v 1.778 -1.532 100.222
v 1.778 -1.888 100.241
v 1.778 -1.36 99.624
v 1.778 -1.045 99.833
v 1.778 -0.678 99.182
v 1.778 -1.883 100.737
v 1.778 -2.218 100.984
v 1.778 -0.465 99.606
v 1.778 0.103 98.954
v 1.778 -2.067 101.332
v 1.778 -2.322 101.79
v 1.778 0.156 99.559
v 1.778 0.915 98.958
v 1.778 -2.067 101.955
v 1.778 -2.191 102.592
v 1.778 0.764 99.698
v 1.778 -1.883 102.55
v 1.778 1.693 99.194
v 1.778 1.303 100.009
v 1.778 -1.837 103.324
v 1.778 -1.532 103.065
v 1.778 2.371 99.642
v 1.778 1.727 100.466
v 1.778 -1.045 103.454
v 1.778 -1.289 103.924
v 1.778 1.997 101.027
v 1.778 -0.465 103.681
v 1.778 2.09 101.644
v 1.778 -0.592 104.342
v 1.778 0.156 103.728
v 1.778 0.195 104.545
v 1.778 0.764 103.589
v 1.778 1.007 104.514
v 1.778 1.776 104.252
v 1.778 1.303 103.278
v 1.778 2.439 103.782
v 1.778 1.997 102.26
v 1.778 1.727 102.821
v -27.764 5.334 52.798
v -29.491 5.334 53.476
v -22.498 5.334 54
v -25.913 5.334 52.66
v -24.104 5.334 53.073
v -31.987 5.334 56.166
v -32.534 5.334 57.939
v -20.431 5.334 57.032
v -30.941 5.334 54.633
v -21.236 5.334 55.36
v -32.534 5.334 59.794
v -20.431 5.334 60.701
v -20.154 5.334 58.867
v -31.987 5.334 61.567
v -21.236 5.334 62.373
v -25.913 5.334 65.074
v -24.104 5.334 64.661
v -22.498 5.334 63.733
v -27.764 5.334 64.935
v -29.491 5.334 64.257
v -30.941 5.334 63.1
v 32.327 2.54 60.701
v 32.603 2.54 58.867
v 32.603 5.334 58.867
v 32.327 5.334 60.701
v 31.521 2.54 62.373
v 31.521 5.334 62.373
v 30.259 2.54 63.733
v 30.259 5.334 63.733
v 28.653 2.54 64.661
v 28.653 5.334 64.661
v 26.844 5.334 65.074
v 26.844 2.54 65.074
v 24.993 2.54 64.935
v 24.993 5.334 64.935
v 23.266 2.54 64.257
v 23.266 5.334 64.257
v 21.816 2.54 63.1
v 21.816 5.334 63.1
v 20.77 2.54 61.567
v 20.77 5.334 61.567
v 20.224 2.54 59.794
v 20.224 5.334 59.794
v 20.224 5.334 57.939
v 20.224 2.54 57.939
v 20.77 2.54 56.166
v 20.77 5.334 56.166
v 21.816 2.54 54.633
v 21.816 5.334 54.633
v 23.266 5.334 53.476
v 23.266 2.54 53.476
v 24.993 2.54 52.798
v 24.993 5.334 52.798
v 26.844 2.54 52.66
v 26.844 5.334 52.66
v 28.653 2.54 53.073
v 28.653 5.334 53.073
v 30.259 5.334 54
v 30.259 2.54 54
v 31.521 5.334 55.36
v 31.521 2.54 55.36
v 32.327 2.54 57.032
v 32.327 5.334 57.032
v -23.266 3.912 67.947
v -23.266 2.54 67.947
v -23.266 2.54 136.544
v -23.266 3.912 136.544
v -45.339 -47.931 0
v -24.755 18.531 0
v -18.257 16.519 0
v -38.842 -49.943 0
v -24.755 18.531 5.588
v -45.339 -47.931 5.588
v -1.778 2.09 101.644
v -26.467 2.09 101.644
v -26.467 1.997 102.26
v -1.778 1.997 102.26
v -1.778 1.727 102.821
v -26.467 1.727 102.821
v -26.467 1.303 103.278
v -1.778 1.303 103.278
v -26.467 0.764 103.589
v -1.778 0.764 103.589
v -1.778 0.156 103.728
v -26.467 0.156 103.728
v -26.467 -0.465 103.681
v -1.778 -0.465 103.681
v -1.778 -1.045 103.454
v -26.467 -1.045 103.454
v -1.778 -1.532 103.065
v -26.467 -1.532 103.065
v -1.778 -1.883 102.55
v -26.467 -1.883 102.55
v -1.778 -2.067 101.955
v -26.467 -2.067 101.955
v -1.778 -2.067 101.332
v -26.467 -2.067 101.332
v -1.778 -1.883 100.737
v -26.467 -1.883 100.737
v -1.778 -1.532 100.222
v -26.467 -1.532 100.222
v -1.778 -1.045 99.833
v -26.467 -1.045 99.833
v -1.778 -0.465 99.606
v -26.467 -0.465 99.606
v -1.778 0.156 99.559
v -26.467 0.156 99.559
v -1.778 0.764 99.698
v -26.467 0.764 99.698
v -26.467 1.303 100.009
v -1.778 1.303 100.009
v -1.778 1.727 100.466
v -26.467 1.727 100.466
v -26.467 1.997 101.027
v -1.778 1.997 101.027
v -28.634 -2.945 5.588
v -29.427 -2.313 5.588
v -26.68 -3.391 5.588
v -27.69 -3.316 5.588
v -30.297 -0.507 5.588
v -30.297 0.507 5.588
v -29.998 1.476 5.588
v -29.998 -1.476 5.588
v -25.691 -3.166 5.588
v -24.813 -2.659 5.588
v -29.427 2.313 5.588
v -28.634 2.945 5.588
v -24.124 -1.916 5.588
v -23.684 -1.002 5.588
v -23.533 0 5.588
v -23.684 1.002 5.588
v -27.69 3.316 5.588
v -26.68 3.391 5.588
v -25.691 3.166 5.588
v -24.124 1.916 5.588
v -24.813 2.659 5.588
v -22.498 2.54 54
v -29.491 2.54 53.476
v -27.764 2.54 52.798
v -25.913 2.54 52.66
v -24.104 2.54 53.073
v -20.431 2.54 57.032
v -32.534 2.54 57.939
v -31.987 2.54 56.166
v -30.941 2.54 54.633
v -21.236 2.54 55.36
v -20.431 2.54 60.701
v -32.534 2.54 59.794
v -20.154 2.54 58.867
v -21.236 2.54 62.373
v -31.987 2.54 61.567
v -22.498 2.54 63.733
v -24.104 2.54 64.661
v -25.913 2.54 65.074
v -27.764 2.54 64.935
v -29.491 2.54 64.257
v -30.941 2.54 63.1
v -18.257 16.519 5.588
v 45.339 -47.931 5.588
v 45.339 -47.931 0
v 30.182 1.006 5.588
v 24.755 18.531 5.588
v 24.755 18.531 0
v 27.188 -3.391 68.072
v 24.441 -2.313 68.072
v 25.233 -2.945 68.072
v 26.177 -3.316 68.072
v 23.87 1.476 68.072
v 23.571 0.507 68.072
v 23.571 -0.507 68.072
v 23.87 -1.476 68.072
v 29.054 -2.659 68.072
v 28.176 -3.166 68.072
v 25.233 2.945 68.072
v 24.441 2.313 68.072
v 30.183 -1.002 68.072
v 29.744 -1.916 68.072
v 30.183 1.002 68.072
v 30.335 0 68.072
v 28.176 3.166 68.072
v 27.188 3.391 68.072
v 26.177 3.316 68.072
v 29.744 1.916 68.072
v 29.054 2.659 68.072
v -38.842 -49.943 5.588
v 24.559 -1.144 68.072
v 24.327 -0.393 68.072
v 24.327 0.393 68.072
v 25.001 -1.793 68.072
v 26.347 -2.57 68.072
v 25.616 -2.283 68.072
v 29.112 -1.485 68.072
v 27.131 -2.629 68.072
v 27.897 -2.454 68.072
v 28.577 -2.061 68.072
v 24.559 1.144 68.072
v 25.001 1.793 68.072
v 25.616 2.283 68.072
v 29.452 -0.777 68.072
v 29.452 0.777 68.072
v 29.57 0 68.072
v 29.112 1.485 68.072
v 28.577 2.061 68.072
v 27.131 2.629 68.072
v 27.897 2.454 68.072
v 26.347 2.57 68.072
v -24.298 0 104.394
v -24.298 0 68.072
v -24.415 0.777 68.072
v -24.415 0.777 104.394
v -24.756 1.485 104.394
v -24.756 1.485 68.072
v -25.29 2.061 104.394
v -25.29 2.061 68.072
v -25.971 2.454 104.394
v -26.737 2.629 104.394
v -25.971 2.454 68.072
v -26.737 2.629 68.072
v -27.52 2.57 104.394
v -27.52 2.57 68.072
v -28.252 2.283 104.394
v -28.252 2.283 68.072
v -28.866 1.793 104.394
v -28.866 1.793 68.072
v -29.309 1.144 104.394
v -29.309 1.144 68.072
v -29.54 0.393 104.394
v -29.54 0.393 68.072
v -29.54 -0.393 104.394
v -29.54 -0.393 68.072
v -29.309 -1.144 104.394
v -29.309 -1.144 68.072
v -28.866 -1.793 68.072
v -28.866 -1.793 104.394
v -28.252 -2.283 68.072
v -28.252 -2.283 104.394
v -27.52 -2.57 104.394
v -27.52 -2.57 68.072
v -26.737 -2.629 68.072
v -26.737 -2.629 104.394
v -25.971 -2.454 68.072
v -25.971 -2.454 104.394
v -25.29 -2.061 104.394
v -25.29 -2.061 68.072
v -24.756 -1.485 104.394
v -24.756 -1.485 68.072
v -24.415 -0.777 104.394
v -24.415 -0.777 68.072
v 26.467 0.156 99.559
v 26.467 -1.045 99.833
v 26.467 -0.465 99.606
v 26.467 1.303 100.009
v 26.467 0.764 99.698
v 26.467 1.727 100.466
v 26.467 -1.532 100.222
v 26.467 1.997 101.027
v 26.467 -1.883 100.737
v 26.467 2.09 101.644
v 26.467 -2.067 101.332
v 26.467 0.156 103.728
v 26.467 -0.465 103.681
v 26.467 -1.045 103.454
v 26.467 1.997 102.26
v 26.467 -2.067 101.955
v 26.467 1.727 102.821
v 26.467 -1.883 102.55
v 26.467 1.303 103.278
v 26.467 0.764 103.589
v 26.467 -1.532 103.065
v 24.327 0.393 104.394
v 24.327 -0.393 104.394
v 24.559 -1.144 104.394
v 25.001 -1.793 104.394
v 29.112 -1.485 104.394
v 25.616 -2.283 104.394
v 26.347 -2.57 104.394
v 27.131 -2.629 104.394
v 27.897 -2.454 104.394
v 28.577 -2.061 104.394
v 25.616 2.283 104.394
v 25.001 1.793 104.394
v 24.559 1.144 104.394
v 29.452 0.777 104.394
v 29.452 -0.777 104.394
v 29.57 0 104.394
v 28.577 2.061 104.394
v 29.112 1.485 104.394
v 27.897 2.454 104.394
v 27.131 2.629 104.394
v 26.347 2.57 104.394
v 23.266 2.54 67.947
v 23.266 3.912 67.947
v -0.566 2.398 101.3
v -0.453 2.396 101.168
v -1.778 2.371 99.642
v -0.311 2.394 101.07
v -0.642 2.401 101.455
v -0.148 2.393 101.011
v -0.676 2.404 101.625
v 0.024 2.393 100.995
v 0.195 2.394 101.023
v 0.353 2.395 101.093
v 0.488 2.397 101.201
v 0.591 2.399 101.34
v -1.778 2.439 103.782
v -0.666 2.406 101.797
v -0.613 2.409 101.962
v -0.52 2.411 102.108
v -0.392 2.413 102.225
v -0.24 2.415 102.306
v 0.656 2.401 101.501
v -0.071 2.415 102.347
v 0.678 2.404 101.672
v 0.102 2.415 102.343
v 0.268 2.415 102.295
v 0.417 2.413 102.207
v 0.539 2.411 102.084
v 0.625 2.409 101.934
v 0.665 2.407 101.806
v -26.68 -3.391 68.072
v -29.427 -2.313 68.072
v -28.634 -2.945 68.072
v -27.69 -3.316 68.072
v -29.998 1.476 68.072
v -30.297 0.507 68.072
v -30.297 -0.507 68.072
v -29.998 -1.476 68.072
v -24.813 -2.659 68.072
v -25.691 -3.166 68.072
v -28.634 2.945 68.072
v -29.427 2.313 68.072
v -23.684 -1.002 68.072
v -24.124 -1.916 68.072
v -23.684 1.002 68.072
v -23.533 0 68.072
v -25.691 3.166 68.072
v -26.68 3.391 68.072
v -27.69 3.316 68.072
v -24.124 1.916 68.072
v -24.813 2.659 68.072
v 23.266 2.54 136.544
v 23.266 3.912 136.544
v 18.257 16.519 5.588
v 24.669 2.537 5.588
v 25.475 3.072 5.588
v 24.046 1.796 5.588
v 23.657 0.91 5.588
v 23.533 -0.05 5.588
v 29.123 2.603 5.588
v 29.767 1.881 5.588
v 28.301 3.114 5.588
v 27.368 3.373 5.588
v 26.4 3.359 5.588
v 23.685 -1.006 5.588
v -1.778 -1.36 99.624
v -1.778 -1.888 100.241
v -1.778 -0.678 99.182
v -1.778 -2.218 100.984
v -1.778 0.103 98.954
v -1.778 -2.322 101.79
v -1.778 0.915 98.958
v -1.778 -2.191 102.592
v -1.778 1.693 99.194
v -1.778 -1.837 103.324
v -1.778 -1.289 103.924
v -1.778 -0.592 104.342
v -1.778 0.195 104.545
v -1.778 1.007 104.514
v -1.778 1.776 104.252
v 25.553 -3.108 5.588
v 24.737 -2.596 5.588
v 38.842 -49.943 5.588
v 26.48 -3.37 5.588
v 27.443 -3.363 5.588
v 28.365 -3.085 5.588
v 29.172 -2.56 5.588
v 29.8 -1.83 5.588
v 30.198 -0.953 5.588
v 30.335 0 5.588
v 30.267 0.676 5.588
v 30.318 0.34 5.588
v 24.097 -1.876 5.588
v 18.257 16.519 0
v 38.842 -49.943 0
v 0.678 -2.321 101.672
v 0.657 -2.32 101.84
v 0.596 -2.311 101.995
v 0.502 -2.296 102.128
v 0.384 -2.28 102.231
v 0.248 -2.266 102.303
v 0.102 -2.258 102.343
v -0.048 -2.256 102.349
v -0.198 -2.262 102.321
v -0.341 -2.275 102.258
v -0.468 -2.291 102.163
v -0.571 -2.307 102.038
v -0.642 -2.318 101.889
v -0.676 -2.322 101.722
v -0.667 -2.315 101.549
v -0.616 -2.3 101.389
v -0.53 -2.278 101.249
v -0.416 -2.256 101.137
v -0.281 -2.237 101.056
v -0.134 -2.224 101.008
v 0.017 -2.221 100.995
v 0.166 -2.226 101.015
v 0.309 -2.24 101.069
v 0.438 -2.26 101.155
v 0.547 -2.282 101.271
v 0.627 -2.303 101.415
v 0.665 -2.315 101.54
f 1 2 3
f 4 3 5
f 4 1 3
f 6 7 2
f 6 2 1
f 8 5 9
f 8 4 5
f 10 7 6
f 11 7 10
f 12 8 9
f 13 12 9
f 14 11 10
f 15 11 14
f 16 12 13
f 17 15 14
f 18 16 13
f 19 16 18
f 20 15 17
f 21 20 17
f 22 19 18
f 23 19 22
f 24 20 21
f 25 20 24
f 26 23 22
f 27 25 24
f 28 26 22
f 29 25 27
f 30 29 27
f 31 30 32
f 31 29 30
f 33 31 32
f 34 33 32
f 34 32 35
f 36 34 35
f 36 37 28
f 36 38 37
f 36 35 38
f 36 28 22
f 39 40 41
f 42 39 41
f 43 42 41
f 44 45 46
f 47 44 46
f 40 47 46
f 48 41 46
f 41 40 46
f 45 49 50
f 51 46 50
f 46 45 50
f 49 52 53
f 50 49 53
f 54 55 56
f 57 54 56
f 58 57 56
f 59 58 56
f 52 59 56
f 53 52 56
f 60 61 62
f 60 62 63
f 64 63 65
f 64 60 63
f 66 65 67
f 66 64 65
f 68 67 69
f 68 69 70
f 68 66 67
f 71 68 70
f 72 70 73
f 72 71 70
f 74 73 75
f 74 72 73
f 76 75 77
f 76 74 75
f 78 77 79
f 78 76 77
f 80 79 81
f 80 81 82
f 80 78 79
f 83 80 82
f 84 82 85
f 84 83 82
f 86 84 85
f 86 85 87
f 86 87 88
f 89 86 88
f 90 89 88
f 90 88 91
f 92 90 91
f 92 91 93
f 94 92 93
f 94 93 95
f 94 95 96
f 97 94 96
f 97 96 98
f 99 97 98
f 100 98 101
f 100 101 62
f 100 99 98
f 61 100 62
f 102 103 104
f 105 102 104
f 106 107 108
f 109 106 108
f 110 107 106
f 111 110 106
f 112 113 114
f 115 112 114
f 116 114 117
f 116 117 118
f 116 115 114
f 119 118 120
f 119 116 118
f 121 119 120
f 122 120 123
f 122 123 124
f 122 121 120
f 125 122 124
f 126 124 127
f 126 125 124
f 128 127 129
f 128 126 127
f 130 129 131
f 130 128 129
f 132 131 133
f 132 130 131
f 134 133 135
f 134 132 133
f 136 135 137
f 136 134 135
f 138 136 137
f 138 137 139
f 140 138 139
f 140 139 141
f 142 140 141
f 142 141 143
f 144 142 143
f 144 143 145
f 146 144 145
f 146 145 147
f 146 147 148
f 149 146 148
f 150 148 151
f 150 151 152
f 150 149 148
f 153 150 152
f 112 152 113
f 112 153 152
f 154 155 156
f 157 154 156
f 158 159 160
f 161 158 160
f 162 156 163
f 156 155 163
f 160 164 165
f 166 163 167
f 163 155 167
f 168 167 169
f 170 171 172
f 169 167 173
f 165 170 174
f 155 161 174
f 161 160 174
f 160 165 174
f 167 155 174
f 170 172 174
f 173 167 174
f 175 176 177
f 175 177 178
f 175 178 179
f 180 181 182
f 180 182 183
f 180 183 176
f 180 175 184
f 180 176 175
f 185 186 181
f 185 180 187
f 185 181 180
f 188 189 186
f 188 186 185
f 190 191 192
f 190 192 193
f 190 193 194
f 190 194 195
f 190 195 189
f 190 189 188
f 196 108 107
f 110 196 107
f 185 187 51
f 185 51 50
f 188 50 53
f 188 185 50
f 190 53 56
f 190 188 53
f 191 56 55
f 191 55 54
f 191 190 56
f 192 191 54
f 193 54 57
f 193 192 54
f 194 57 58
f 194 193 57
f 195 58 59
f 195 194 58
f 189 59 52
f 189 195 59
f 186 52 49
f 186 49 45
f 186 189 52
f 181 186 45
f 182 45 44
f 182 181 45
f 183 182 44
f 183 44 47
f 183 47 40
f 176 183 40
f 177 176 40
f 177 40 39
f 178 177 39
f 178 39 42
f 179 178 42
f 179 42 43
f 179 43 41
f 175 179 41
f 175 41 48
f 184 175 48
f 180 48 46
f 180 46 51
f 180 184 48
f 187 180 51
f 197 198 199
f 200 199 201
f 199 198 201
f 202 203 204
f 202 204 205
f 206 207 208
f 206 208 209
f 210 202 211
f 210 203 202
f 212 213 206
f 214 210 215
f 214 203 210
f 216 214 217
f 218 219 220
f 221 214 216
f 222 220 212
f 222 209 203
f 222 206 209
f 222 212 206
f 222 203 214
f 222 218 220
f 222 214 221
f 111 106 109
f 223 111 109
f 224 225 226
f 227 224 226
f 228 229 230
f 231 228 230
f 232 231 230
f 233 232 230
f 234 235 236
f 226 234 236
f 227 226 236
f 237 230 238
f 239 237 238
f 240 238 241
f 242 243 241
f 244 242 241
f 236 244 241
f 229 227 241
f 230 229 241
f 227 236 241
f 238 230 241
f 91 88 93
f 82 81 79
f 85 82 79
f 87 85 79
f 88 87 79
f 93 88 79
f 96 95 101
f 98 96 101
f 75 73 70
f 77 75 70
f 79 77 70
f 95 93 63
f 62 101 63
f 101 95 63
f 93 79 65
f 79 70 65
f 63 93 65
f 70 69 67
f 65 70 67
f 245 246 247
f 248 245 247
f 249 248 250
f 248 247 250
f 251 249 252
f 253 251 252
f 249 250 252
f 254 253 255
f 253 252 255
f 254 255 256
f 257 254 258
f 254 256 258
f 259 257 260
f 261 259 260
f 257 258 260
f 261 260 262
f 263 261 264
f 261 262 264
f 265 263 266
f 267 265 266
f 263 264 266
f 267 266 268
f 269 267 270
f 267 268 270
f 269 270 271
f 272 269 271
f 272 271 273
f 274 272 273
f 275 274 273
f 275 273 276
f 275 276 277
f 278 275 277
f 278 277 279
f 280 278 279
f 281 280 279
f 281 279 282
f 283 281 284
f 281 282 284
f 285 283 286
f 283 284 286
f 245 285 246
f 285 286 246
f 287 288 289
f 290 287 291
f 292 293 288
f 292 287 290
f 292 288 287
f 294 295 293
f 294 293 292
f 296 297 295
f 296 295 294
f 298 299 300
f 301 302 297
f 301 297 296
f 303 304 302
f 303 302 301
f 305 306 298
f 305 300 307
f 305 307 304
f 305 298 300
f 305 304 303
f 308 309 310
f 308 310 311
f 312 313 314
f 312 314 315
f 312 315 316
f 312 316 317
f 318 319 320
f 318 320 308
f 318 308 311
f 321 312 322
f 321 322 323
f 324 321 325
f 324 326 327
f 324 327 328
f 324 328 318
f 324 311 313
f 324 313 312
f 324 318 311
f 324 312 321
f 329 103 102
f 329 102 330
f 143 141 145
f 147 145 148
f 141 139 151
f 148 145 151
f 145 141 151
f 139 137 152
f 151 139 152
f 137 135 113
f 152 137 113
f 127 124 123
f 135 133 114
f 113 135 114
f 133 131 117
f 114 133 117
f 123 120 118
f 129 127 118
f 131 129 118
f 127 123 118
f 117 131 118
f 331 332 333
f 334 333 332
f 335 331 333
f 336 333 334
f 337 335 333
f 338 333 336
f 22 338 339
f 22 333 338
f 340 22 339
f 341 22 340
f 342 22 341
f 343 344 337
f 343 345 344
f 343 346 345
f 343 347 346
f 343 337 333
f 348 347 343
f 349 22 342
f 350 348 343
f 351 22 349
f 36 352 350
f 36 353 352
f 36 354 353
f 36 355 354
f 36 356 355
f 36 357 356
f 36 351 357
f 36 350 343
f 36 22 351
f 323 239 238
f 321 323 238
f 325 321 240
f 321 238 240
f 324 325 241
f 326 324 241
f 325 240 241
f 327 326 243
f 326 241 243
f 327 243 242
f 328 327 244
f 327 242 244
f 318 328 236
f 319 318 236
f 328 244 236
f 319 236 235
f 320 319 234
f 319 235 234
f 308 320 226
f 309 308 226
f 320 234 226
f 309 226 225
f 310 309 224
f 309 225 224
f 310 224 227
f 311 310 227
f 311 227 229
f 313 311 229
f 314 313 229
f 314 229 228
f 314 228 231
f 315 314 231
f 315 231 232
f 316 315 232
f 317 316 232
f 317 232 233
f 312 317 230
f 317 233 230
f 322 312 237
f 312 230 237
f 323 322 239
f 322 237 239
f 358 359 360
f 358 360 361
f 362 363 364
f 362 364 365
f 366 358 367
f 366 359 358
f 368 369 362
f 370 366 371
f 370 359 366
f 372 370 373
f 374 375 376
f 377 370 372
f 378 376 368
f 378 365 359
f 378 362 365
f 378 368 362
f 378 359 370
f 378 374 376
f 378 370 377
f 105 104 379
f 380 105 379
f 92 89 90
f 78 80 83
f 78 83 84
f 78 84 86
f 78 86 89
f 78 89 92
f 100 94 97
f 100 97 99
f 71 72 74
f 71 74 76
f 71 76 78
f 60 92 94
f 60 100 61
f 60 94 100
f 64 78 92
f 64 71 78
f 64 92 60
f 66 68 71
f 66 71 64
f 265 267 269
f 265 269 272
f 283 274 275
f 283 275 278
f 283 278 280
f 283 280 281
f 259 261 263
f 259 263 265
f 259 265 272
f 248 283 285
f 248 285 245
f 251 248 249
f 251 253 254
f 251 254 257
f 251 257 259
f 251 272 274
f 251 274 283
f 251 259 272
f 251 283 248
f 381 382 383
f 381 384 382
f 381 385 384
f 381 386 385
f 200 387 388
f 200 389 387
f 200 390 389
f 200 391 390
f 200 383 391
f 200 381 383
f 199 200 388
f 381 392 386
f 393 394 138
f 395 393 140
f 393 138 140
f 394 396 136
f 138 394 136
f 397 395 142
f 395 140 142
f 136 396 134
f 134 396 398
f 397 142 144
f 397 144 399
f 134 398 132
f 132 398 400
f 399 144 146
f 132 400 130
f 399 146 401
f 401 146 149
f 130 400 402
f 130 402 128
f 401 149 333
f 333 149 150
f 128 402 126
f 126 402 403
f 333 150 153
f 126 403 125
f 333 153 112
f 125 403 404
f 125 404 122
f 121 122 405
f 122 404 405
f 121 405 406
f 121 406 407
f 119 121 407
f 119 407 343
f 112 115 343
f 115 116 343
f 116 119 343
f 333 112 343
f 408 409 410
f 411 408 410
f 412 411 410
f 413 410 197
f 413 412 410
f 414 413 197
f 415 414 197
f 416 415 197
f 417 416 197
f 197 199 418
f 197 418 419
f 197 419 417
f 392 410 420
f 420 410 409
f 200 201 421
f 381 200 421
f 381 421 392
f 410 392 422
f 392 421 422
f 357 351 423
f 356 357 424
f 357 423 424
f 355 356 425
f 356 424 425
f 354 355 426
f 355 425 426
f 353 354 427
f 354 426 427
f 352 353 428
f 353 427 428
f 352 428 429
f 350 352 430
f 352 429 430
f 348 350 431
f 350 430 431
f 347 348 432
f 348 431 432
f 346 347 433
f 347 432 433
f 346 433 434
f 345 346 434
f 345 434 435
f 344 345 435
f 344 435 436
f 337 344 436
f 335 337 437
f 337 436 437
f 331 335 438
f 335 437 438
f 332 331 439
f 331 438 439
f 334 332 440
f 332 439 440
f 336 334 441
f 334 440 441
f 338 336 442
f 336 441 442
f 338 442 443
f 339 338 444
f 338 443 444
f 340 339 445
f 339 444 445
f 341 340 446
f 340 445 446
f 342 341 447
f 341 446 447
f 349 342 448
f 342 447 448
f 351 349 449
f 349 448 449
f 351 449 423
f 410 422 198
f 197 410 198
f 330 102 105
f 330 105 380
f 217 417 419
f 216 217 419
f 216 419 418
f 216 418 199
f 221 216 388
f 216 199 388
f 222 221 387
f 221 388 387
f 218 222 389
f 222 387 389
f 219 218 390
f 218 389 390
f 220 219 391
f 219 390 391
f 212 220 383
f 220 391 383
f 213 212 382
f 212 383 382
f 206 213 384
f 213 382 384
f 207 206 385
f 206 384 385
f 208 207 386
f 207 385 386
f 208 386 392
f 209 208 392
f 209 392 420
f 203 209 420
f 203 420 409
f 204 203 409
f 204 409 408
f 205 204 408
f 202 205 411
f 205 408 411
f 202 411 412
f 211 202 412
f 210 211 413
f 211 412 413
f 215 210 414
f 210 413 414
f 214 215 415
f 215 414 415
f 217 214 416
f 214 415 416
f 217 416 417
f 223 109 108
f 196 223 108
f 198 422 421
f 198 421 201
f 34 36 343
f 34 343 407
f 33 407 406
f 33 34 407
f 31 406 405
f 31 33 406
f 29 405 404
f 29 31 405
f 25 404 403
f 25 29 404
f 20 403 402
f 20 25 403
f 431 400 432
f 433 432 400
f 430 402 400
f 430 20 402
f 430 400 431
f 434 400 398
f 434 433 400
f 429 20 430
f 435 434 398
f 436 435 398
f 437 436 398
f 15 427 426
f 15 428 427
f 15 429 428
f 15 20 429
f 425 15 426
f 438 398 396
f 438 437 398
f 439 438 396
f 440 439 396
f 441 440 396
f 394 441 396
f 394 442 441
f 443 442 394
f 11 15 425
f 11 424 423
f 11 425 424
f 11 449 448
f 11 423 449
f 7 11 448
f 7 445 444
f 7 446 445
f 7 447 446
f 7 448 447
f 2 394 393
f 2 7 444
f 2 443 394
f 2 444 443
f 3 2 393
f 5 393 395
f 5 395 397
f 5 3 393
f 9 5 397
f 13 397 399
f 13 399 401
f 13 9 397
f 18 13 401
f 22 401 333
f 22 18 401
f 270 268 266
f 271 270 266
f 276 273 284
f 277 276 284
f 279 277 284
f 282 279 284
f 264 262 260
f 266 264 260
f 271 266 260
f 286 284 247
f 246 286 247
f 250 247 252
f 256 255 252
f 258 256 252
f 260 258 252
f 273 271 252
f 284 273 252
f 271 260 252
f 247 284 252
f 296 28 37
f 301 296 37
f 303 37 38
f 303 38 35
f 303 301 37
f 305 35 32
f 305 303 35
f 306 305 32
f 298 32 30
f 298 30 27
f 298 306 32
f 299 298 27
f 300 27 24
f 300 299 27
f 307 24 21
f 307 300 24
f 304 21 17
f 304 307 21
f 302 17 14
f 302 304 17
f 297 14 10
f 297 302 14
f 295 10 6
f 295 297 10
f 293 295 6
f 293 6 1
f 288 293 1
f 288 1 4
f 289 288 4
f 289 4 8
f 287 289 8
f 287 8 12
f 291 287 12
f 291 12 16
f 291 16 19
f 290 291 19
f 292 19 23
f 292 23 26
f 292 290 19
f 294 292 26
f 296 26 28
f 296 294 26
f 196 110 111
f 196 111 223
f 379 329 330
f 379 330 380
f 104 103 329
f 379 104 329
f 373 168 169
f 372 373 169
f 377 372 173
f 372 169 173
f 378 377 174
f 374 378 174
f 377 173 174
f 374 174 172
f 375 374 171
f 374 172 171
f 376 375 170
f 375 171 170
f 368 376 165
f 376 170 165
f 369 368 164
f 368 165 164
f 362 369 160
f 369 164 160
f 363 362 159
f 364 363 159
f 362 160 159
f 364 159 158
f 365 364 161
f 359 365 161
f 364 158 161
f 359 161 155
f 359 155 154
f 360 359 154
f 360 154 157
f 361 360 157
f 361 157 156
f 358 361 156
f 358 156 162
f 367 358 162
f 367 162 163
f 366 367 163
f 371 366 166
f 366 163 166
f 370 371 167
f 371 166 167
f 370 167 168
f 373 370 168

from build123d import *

# Parameters (mm, degrees)
F1_DEPTH  = 5.588
F2_R      = 3.400863531
F3_DEPTH  = 62.484
F4_R      = 2.6358793968
F5_DEPTH  = 36.322
F6_R      = 2.0902316786
F7_DEPTH  = 26.4668
F9_W      = 46.5320684016
F9_H      = 68.596586585
F10_DEPTH = 1.3716
F11_R     = 6.2245067114
F12_DEPTH = 2.794
F14_DEPTH = 1.778
F15_R     = 0.6779698322
F16_DEPTH = 3.7084
F17_DEPTH = 6.1214


with BuildPart() as f1:
    # F0 (on Top) → F1 (new body)
    with BuildSketch(Plane.XY):
        Polygon((24.754703592, 18.5309260663), (18.2574551058, 16.5186504552), (38.8415608429, -49.9434430581), (45.338809329, -47.931167447), align=None)
    extrude(amount=F1_DEPTH)

    # F2 (on face) → F3 (join)
    with BuildSketch(Plane.XY.offset(5.588)):
        with Locations((26.9337159988, 0)):
            Circle(F2_R)
    extrude(amount=F3_DEPTH)


with BuildPart() as f1b:
    # F0 (on Top) → F1, piece 2 (new body)
    with BuildSketch(Plane.XY):
        Polygon((-24.754703592, 18.5309260663), (-45.338809329, -47.931167447), (-38.8415608429, -49.9434430581), (-18.2574551058, 16.5186504552), align=None)
    extrude(amount=F1_DEPTH)


with BuildPart() as f3:
    # F2 (on face) → F3, piece 2 (new body)
    with BuildSketch(Plane.XY.offset(5.588)):
        with Locations((-26.9337159988, 0)):
            Circle(F2_R)
    extrude(amount=F3_DEPTH)


with BuildPart() as f5:
    # F4 (on face) → F5 (new body)
    with BuildSketch(Plane.XY.offset(68.072)):
        with Locations((26.9337159988, 0)):
            Circle(F4_R)
    extrude(amount=F5_DEPTH)


with BuildPart() as f5b:
    # F4 (on face) → F5, piece 2 (new body)
    with BuildSketch(Plane.XY.offset(68.072)):
        with Locations((-26.9337159988, 0)):
            Circle(F4_R)
    extrude(amount=F5_DEPTH)


with BuildPart() as f7:
    # F6 (on Right) → F7 (new body, symmetric)
    with BuildSketch(Plane.YZ):
        with Locations((0, 101.6435548663)):
            Circle(F6_R)
    extrude(amount=F7_DEPTH, both=True)

    # F13 (on Right) → F14 (join, symmetric)
    with BuildSketch(Plane.YZ):
        with BuildLine():
            Line((2.3708415683, 99.6423438191), (2.4390823673, 103.782273829))
            ThreePointArc((2.4390823673, 103.782273829), (-2.3216692714, 101.79022055), (2.3708415683, 99.6423438191))
        make_face()
    extrude(amount=F14_DEPTH, both=True)

    # F15 (on Front) → F16 (cut)
    with BuildSketch(Plane.XZ):
        with Locations((0, 101.6723290086)):
            Circle(F15_R)
    extrude(amount=F16_DEPTH, mode=Mode.SUBTRACT)

    # F17 (cut): a face of the model
    f17_faces = [f7.faces().sort_by_distance(p)[0] for p in [
        (0, 0, 101.6723290086),
    ]]
    extrude(f17_faces, amount=-F17_DEPTH, mode=Mode.SUBTRACT)


with BuildPart() as f10:
    # F9 (on offset) → F10 (new body)
    with BuildSketch(Plane.XZ.offset(-2.54)):
        with Locations((0, 102.2457927465)):
            Rectangle(F9_W, F9_H)
    extrude(amount=-F10_DEPTH)


with BuildPart() as f12:
    # F11 (on offset) → F12 (new body)
    with BuildSketch(Plane.XZ.offset(-2.54)):
        with Locations((26.3785496354, 58.8667541742)):
            Circle(F11_R)
    extrude(amount=-F12_DEPTH)


with BuildPart() as f12b:
    # F11 (on offset) → F12, piece 2 (new body)
    with BuildSketch(Plane.XZ.offset(-2.54)):
        with Locations((-26.3785496354, 58.8667541742)):
            Circle(F11_R)
    extrude(amount=-F12_DEPTH)


solid = Compound([f1.part, f1b.part, f3.part, f5.part, f5b.part, f7.part, f10.part, f12.part, f12b.part])
